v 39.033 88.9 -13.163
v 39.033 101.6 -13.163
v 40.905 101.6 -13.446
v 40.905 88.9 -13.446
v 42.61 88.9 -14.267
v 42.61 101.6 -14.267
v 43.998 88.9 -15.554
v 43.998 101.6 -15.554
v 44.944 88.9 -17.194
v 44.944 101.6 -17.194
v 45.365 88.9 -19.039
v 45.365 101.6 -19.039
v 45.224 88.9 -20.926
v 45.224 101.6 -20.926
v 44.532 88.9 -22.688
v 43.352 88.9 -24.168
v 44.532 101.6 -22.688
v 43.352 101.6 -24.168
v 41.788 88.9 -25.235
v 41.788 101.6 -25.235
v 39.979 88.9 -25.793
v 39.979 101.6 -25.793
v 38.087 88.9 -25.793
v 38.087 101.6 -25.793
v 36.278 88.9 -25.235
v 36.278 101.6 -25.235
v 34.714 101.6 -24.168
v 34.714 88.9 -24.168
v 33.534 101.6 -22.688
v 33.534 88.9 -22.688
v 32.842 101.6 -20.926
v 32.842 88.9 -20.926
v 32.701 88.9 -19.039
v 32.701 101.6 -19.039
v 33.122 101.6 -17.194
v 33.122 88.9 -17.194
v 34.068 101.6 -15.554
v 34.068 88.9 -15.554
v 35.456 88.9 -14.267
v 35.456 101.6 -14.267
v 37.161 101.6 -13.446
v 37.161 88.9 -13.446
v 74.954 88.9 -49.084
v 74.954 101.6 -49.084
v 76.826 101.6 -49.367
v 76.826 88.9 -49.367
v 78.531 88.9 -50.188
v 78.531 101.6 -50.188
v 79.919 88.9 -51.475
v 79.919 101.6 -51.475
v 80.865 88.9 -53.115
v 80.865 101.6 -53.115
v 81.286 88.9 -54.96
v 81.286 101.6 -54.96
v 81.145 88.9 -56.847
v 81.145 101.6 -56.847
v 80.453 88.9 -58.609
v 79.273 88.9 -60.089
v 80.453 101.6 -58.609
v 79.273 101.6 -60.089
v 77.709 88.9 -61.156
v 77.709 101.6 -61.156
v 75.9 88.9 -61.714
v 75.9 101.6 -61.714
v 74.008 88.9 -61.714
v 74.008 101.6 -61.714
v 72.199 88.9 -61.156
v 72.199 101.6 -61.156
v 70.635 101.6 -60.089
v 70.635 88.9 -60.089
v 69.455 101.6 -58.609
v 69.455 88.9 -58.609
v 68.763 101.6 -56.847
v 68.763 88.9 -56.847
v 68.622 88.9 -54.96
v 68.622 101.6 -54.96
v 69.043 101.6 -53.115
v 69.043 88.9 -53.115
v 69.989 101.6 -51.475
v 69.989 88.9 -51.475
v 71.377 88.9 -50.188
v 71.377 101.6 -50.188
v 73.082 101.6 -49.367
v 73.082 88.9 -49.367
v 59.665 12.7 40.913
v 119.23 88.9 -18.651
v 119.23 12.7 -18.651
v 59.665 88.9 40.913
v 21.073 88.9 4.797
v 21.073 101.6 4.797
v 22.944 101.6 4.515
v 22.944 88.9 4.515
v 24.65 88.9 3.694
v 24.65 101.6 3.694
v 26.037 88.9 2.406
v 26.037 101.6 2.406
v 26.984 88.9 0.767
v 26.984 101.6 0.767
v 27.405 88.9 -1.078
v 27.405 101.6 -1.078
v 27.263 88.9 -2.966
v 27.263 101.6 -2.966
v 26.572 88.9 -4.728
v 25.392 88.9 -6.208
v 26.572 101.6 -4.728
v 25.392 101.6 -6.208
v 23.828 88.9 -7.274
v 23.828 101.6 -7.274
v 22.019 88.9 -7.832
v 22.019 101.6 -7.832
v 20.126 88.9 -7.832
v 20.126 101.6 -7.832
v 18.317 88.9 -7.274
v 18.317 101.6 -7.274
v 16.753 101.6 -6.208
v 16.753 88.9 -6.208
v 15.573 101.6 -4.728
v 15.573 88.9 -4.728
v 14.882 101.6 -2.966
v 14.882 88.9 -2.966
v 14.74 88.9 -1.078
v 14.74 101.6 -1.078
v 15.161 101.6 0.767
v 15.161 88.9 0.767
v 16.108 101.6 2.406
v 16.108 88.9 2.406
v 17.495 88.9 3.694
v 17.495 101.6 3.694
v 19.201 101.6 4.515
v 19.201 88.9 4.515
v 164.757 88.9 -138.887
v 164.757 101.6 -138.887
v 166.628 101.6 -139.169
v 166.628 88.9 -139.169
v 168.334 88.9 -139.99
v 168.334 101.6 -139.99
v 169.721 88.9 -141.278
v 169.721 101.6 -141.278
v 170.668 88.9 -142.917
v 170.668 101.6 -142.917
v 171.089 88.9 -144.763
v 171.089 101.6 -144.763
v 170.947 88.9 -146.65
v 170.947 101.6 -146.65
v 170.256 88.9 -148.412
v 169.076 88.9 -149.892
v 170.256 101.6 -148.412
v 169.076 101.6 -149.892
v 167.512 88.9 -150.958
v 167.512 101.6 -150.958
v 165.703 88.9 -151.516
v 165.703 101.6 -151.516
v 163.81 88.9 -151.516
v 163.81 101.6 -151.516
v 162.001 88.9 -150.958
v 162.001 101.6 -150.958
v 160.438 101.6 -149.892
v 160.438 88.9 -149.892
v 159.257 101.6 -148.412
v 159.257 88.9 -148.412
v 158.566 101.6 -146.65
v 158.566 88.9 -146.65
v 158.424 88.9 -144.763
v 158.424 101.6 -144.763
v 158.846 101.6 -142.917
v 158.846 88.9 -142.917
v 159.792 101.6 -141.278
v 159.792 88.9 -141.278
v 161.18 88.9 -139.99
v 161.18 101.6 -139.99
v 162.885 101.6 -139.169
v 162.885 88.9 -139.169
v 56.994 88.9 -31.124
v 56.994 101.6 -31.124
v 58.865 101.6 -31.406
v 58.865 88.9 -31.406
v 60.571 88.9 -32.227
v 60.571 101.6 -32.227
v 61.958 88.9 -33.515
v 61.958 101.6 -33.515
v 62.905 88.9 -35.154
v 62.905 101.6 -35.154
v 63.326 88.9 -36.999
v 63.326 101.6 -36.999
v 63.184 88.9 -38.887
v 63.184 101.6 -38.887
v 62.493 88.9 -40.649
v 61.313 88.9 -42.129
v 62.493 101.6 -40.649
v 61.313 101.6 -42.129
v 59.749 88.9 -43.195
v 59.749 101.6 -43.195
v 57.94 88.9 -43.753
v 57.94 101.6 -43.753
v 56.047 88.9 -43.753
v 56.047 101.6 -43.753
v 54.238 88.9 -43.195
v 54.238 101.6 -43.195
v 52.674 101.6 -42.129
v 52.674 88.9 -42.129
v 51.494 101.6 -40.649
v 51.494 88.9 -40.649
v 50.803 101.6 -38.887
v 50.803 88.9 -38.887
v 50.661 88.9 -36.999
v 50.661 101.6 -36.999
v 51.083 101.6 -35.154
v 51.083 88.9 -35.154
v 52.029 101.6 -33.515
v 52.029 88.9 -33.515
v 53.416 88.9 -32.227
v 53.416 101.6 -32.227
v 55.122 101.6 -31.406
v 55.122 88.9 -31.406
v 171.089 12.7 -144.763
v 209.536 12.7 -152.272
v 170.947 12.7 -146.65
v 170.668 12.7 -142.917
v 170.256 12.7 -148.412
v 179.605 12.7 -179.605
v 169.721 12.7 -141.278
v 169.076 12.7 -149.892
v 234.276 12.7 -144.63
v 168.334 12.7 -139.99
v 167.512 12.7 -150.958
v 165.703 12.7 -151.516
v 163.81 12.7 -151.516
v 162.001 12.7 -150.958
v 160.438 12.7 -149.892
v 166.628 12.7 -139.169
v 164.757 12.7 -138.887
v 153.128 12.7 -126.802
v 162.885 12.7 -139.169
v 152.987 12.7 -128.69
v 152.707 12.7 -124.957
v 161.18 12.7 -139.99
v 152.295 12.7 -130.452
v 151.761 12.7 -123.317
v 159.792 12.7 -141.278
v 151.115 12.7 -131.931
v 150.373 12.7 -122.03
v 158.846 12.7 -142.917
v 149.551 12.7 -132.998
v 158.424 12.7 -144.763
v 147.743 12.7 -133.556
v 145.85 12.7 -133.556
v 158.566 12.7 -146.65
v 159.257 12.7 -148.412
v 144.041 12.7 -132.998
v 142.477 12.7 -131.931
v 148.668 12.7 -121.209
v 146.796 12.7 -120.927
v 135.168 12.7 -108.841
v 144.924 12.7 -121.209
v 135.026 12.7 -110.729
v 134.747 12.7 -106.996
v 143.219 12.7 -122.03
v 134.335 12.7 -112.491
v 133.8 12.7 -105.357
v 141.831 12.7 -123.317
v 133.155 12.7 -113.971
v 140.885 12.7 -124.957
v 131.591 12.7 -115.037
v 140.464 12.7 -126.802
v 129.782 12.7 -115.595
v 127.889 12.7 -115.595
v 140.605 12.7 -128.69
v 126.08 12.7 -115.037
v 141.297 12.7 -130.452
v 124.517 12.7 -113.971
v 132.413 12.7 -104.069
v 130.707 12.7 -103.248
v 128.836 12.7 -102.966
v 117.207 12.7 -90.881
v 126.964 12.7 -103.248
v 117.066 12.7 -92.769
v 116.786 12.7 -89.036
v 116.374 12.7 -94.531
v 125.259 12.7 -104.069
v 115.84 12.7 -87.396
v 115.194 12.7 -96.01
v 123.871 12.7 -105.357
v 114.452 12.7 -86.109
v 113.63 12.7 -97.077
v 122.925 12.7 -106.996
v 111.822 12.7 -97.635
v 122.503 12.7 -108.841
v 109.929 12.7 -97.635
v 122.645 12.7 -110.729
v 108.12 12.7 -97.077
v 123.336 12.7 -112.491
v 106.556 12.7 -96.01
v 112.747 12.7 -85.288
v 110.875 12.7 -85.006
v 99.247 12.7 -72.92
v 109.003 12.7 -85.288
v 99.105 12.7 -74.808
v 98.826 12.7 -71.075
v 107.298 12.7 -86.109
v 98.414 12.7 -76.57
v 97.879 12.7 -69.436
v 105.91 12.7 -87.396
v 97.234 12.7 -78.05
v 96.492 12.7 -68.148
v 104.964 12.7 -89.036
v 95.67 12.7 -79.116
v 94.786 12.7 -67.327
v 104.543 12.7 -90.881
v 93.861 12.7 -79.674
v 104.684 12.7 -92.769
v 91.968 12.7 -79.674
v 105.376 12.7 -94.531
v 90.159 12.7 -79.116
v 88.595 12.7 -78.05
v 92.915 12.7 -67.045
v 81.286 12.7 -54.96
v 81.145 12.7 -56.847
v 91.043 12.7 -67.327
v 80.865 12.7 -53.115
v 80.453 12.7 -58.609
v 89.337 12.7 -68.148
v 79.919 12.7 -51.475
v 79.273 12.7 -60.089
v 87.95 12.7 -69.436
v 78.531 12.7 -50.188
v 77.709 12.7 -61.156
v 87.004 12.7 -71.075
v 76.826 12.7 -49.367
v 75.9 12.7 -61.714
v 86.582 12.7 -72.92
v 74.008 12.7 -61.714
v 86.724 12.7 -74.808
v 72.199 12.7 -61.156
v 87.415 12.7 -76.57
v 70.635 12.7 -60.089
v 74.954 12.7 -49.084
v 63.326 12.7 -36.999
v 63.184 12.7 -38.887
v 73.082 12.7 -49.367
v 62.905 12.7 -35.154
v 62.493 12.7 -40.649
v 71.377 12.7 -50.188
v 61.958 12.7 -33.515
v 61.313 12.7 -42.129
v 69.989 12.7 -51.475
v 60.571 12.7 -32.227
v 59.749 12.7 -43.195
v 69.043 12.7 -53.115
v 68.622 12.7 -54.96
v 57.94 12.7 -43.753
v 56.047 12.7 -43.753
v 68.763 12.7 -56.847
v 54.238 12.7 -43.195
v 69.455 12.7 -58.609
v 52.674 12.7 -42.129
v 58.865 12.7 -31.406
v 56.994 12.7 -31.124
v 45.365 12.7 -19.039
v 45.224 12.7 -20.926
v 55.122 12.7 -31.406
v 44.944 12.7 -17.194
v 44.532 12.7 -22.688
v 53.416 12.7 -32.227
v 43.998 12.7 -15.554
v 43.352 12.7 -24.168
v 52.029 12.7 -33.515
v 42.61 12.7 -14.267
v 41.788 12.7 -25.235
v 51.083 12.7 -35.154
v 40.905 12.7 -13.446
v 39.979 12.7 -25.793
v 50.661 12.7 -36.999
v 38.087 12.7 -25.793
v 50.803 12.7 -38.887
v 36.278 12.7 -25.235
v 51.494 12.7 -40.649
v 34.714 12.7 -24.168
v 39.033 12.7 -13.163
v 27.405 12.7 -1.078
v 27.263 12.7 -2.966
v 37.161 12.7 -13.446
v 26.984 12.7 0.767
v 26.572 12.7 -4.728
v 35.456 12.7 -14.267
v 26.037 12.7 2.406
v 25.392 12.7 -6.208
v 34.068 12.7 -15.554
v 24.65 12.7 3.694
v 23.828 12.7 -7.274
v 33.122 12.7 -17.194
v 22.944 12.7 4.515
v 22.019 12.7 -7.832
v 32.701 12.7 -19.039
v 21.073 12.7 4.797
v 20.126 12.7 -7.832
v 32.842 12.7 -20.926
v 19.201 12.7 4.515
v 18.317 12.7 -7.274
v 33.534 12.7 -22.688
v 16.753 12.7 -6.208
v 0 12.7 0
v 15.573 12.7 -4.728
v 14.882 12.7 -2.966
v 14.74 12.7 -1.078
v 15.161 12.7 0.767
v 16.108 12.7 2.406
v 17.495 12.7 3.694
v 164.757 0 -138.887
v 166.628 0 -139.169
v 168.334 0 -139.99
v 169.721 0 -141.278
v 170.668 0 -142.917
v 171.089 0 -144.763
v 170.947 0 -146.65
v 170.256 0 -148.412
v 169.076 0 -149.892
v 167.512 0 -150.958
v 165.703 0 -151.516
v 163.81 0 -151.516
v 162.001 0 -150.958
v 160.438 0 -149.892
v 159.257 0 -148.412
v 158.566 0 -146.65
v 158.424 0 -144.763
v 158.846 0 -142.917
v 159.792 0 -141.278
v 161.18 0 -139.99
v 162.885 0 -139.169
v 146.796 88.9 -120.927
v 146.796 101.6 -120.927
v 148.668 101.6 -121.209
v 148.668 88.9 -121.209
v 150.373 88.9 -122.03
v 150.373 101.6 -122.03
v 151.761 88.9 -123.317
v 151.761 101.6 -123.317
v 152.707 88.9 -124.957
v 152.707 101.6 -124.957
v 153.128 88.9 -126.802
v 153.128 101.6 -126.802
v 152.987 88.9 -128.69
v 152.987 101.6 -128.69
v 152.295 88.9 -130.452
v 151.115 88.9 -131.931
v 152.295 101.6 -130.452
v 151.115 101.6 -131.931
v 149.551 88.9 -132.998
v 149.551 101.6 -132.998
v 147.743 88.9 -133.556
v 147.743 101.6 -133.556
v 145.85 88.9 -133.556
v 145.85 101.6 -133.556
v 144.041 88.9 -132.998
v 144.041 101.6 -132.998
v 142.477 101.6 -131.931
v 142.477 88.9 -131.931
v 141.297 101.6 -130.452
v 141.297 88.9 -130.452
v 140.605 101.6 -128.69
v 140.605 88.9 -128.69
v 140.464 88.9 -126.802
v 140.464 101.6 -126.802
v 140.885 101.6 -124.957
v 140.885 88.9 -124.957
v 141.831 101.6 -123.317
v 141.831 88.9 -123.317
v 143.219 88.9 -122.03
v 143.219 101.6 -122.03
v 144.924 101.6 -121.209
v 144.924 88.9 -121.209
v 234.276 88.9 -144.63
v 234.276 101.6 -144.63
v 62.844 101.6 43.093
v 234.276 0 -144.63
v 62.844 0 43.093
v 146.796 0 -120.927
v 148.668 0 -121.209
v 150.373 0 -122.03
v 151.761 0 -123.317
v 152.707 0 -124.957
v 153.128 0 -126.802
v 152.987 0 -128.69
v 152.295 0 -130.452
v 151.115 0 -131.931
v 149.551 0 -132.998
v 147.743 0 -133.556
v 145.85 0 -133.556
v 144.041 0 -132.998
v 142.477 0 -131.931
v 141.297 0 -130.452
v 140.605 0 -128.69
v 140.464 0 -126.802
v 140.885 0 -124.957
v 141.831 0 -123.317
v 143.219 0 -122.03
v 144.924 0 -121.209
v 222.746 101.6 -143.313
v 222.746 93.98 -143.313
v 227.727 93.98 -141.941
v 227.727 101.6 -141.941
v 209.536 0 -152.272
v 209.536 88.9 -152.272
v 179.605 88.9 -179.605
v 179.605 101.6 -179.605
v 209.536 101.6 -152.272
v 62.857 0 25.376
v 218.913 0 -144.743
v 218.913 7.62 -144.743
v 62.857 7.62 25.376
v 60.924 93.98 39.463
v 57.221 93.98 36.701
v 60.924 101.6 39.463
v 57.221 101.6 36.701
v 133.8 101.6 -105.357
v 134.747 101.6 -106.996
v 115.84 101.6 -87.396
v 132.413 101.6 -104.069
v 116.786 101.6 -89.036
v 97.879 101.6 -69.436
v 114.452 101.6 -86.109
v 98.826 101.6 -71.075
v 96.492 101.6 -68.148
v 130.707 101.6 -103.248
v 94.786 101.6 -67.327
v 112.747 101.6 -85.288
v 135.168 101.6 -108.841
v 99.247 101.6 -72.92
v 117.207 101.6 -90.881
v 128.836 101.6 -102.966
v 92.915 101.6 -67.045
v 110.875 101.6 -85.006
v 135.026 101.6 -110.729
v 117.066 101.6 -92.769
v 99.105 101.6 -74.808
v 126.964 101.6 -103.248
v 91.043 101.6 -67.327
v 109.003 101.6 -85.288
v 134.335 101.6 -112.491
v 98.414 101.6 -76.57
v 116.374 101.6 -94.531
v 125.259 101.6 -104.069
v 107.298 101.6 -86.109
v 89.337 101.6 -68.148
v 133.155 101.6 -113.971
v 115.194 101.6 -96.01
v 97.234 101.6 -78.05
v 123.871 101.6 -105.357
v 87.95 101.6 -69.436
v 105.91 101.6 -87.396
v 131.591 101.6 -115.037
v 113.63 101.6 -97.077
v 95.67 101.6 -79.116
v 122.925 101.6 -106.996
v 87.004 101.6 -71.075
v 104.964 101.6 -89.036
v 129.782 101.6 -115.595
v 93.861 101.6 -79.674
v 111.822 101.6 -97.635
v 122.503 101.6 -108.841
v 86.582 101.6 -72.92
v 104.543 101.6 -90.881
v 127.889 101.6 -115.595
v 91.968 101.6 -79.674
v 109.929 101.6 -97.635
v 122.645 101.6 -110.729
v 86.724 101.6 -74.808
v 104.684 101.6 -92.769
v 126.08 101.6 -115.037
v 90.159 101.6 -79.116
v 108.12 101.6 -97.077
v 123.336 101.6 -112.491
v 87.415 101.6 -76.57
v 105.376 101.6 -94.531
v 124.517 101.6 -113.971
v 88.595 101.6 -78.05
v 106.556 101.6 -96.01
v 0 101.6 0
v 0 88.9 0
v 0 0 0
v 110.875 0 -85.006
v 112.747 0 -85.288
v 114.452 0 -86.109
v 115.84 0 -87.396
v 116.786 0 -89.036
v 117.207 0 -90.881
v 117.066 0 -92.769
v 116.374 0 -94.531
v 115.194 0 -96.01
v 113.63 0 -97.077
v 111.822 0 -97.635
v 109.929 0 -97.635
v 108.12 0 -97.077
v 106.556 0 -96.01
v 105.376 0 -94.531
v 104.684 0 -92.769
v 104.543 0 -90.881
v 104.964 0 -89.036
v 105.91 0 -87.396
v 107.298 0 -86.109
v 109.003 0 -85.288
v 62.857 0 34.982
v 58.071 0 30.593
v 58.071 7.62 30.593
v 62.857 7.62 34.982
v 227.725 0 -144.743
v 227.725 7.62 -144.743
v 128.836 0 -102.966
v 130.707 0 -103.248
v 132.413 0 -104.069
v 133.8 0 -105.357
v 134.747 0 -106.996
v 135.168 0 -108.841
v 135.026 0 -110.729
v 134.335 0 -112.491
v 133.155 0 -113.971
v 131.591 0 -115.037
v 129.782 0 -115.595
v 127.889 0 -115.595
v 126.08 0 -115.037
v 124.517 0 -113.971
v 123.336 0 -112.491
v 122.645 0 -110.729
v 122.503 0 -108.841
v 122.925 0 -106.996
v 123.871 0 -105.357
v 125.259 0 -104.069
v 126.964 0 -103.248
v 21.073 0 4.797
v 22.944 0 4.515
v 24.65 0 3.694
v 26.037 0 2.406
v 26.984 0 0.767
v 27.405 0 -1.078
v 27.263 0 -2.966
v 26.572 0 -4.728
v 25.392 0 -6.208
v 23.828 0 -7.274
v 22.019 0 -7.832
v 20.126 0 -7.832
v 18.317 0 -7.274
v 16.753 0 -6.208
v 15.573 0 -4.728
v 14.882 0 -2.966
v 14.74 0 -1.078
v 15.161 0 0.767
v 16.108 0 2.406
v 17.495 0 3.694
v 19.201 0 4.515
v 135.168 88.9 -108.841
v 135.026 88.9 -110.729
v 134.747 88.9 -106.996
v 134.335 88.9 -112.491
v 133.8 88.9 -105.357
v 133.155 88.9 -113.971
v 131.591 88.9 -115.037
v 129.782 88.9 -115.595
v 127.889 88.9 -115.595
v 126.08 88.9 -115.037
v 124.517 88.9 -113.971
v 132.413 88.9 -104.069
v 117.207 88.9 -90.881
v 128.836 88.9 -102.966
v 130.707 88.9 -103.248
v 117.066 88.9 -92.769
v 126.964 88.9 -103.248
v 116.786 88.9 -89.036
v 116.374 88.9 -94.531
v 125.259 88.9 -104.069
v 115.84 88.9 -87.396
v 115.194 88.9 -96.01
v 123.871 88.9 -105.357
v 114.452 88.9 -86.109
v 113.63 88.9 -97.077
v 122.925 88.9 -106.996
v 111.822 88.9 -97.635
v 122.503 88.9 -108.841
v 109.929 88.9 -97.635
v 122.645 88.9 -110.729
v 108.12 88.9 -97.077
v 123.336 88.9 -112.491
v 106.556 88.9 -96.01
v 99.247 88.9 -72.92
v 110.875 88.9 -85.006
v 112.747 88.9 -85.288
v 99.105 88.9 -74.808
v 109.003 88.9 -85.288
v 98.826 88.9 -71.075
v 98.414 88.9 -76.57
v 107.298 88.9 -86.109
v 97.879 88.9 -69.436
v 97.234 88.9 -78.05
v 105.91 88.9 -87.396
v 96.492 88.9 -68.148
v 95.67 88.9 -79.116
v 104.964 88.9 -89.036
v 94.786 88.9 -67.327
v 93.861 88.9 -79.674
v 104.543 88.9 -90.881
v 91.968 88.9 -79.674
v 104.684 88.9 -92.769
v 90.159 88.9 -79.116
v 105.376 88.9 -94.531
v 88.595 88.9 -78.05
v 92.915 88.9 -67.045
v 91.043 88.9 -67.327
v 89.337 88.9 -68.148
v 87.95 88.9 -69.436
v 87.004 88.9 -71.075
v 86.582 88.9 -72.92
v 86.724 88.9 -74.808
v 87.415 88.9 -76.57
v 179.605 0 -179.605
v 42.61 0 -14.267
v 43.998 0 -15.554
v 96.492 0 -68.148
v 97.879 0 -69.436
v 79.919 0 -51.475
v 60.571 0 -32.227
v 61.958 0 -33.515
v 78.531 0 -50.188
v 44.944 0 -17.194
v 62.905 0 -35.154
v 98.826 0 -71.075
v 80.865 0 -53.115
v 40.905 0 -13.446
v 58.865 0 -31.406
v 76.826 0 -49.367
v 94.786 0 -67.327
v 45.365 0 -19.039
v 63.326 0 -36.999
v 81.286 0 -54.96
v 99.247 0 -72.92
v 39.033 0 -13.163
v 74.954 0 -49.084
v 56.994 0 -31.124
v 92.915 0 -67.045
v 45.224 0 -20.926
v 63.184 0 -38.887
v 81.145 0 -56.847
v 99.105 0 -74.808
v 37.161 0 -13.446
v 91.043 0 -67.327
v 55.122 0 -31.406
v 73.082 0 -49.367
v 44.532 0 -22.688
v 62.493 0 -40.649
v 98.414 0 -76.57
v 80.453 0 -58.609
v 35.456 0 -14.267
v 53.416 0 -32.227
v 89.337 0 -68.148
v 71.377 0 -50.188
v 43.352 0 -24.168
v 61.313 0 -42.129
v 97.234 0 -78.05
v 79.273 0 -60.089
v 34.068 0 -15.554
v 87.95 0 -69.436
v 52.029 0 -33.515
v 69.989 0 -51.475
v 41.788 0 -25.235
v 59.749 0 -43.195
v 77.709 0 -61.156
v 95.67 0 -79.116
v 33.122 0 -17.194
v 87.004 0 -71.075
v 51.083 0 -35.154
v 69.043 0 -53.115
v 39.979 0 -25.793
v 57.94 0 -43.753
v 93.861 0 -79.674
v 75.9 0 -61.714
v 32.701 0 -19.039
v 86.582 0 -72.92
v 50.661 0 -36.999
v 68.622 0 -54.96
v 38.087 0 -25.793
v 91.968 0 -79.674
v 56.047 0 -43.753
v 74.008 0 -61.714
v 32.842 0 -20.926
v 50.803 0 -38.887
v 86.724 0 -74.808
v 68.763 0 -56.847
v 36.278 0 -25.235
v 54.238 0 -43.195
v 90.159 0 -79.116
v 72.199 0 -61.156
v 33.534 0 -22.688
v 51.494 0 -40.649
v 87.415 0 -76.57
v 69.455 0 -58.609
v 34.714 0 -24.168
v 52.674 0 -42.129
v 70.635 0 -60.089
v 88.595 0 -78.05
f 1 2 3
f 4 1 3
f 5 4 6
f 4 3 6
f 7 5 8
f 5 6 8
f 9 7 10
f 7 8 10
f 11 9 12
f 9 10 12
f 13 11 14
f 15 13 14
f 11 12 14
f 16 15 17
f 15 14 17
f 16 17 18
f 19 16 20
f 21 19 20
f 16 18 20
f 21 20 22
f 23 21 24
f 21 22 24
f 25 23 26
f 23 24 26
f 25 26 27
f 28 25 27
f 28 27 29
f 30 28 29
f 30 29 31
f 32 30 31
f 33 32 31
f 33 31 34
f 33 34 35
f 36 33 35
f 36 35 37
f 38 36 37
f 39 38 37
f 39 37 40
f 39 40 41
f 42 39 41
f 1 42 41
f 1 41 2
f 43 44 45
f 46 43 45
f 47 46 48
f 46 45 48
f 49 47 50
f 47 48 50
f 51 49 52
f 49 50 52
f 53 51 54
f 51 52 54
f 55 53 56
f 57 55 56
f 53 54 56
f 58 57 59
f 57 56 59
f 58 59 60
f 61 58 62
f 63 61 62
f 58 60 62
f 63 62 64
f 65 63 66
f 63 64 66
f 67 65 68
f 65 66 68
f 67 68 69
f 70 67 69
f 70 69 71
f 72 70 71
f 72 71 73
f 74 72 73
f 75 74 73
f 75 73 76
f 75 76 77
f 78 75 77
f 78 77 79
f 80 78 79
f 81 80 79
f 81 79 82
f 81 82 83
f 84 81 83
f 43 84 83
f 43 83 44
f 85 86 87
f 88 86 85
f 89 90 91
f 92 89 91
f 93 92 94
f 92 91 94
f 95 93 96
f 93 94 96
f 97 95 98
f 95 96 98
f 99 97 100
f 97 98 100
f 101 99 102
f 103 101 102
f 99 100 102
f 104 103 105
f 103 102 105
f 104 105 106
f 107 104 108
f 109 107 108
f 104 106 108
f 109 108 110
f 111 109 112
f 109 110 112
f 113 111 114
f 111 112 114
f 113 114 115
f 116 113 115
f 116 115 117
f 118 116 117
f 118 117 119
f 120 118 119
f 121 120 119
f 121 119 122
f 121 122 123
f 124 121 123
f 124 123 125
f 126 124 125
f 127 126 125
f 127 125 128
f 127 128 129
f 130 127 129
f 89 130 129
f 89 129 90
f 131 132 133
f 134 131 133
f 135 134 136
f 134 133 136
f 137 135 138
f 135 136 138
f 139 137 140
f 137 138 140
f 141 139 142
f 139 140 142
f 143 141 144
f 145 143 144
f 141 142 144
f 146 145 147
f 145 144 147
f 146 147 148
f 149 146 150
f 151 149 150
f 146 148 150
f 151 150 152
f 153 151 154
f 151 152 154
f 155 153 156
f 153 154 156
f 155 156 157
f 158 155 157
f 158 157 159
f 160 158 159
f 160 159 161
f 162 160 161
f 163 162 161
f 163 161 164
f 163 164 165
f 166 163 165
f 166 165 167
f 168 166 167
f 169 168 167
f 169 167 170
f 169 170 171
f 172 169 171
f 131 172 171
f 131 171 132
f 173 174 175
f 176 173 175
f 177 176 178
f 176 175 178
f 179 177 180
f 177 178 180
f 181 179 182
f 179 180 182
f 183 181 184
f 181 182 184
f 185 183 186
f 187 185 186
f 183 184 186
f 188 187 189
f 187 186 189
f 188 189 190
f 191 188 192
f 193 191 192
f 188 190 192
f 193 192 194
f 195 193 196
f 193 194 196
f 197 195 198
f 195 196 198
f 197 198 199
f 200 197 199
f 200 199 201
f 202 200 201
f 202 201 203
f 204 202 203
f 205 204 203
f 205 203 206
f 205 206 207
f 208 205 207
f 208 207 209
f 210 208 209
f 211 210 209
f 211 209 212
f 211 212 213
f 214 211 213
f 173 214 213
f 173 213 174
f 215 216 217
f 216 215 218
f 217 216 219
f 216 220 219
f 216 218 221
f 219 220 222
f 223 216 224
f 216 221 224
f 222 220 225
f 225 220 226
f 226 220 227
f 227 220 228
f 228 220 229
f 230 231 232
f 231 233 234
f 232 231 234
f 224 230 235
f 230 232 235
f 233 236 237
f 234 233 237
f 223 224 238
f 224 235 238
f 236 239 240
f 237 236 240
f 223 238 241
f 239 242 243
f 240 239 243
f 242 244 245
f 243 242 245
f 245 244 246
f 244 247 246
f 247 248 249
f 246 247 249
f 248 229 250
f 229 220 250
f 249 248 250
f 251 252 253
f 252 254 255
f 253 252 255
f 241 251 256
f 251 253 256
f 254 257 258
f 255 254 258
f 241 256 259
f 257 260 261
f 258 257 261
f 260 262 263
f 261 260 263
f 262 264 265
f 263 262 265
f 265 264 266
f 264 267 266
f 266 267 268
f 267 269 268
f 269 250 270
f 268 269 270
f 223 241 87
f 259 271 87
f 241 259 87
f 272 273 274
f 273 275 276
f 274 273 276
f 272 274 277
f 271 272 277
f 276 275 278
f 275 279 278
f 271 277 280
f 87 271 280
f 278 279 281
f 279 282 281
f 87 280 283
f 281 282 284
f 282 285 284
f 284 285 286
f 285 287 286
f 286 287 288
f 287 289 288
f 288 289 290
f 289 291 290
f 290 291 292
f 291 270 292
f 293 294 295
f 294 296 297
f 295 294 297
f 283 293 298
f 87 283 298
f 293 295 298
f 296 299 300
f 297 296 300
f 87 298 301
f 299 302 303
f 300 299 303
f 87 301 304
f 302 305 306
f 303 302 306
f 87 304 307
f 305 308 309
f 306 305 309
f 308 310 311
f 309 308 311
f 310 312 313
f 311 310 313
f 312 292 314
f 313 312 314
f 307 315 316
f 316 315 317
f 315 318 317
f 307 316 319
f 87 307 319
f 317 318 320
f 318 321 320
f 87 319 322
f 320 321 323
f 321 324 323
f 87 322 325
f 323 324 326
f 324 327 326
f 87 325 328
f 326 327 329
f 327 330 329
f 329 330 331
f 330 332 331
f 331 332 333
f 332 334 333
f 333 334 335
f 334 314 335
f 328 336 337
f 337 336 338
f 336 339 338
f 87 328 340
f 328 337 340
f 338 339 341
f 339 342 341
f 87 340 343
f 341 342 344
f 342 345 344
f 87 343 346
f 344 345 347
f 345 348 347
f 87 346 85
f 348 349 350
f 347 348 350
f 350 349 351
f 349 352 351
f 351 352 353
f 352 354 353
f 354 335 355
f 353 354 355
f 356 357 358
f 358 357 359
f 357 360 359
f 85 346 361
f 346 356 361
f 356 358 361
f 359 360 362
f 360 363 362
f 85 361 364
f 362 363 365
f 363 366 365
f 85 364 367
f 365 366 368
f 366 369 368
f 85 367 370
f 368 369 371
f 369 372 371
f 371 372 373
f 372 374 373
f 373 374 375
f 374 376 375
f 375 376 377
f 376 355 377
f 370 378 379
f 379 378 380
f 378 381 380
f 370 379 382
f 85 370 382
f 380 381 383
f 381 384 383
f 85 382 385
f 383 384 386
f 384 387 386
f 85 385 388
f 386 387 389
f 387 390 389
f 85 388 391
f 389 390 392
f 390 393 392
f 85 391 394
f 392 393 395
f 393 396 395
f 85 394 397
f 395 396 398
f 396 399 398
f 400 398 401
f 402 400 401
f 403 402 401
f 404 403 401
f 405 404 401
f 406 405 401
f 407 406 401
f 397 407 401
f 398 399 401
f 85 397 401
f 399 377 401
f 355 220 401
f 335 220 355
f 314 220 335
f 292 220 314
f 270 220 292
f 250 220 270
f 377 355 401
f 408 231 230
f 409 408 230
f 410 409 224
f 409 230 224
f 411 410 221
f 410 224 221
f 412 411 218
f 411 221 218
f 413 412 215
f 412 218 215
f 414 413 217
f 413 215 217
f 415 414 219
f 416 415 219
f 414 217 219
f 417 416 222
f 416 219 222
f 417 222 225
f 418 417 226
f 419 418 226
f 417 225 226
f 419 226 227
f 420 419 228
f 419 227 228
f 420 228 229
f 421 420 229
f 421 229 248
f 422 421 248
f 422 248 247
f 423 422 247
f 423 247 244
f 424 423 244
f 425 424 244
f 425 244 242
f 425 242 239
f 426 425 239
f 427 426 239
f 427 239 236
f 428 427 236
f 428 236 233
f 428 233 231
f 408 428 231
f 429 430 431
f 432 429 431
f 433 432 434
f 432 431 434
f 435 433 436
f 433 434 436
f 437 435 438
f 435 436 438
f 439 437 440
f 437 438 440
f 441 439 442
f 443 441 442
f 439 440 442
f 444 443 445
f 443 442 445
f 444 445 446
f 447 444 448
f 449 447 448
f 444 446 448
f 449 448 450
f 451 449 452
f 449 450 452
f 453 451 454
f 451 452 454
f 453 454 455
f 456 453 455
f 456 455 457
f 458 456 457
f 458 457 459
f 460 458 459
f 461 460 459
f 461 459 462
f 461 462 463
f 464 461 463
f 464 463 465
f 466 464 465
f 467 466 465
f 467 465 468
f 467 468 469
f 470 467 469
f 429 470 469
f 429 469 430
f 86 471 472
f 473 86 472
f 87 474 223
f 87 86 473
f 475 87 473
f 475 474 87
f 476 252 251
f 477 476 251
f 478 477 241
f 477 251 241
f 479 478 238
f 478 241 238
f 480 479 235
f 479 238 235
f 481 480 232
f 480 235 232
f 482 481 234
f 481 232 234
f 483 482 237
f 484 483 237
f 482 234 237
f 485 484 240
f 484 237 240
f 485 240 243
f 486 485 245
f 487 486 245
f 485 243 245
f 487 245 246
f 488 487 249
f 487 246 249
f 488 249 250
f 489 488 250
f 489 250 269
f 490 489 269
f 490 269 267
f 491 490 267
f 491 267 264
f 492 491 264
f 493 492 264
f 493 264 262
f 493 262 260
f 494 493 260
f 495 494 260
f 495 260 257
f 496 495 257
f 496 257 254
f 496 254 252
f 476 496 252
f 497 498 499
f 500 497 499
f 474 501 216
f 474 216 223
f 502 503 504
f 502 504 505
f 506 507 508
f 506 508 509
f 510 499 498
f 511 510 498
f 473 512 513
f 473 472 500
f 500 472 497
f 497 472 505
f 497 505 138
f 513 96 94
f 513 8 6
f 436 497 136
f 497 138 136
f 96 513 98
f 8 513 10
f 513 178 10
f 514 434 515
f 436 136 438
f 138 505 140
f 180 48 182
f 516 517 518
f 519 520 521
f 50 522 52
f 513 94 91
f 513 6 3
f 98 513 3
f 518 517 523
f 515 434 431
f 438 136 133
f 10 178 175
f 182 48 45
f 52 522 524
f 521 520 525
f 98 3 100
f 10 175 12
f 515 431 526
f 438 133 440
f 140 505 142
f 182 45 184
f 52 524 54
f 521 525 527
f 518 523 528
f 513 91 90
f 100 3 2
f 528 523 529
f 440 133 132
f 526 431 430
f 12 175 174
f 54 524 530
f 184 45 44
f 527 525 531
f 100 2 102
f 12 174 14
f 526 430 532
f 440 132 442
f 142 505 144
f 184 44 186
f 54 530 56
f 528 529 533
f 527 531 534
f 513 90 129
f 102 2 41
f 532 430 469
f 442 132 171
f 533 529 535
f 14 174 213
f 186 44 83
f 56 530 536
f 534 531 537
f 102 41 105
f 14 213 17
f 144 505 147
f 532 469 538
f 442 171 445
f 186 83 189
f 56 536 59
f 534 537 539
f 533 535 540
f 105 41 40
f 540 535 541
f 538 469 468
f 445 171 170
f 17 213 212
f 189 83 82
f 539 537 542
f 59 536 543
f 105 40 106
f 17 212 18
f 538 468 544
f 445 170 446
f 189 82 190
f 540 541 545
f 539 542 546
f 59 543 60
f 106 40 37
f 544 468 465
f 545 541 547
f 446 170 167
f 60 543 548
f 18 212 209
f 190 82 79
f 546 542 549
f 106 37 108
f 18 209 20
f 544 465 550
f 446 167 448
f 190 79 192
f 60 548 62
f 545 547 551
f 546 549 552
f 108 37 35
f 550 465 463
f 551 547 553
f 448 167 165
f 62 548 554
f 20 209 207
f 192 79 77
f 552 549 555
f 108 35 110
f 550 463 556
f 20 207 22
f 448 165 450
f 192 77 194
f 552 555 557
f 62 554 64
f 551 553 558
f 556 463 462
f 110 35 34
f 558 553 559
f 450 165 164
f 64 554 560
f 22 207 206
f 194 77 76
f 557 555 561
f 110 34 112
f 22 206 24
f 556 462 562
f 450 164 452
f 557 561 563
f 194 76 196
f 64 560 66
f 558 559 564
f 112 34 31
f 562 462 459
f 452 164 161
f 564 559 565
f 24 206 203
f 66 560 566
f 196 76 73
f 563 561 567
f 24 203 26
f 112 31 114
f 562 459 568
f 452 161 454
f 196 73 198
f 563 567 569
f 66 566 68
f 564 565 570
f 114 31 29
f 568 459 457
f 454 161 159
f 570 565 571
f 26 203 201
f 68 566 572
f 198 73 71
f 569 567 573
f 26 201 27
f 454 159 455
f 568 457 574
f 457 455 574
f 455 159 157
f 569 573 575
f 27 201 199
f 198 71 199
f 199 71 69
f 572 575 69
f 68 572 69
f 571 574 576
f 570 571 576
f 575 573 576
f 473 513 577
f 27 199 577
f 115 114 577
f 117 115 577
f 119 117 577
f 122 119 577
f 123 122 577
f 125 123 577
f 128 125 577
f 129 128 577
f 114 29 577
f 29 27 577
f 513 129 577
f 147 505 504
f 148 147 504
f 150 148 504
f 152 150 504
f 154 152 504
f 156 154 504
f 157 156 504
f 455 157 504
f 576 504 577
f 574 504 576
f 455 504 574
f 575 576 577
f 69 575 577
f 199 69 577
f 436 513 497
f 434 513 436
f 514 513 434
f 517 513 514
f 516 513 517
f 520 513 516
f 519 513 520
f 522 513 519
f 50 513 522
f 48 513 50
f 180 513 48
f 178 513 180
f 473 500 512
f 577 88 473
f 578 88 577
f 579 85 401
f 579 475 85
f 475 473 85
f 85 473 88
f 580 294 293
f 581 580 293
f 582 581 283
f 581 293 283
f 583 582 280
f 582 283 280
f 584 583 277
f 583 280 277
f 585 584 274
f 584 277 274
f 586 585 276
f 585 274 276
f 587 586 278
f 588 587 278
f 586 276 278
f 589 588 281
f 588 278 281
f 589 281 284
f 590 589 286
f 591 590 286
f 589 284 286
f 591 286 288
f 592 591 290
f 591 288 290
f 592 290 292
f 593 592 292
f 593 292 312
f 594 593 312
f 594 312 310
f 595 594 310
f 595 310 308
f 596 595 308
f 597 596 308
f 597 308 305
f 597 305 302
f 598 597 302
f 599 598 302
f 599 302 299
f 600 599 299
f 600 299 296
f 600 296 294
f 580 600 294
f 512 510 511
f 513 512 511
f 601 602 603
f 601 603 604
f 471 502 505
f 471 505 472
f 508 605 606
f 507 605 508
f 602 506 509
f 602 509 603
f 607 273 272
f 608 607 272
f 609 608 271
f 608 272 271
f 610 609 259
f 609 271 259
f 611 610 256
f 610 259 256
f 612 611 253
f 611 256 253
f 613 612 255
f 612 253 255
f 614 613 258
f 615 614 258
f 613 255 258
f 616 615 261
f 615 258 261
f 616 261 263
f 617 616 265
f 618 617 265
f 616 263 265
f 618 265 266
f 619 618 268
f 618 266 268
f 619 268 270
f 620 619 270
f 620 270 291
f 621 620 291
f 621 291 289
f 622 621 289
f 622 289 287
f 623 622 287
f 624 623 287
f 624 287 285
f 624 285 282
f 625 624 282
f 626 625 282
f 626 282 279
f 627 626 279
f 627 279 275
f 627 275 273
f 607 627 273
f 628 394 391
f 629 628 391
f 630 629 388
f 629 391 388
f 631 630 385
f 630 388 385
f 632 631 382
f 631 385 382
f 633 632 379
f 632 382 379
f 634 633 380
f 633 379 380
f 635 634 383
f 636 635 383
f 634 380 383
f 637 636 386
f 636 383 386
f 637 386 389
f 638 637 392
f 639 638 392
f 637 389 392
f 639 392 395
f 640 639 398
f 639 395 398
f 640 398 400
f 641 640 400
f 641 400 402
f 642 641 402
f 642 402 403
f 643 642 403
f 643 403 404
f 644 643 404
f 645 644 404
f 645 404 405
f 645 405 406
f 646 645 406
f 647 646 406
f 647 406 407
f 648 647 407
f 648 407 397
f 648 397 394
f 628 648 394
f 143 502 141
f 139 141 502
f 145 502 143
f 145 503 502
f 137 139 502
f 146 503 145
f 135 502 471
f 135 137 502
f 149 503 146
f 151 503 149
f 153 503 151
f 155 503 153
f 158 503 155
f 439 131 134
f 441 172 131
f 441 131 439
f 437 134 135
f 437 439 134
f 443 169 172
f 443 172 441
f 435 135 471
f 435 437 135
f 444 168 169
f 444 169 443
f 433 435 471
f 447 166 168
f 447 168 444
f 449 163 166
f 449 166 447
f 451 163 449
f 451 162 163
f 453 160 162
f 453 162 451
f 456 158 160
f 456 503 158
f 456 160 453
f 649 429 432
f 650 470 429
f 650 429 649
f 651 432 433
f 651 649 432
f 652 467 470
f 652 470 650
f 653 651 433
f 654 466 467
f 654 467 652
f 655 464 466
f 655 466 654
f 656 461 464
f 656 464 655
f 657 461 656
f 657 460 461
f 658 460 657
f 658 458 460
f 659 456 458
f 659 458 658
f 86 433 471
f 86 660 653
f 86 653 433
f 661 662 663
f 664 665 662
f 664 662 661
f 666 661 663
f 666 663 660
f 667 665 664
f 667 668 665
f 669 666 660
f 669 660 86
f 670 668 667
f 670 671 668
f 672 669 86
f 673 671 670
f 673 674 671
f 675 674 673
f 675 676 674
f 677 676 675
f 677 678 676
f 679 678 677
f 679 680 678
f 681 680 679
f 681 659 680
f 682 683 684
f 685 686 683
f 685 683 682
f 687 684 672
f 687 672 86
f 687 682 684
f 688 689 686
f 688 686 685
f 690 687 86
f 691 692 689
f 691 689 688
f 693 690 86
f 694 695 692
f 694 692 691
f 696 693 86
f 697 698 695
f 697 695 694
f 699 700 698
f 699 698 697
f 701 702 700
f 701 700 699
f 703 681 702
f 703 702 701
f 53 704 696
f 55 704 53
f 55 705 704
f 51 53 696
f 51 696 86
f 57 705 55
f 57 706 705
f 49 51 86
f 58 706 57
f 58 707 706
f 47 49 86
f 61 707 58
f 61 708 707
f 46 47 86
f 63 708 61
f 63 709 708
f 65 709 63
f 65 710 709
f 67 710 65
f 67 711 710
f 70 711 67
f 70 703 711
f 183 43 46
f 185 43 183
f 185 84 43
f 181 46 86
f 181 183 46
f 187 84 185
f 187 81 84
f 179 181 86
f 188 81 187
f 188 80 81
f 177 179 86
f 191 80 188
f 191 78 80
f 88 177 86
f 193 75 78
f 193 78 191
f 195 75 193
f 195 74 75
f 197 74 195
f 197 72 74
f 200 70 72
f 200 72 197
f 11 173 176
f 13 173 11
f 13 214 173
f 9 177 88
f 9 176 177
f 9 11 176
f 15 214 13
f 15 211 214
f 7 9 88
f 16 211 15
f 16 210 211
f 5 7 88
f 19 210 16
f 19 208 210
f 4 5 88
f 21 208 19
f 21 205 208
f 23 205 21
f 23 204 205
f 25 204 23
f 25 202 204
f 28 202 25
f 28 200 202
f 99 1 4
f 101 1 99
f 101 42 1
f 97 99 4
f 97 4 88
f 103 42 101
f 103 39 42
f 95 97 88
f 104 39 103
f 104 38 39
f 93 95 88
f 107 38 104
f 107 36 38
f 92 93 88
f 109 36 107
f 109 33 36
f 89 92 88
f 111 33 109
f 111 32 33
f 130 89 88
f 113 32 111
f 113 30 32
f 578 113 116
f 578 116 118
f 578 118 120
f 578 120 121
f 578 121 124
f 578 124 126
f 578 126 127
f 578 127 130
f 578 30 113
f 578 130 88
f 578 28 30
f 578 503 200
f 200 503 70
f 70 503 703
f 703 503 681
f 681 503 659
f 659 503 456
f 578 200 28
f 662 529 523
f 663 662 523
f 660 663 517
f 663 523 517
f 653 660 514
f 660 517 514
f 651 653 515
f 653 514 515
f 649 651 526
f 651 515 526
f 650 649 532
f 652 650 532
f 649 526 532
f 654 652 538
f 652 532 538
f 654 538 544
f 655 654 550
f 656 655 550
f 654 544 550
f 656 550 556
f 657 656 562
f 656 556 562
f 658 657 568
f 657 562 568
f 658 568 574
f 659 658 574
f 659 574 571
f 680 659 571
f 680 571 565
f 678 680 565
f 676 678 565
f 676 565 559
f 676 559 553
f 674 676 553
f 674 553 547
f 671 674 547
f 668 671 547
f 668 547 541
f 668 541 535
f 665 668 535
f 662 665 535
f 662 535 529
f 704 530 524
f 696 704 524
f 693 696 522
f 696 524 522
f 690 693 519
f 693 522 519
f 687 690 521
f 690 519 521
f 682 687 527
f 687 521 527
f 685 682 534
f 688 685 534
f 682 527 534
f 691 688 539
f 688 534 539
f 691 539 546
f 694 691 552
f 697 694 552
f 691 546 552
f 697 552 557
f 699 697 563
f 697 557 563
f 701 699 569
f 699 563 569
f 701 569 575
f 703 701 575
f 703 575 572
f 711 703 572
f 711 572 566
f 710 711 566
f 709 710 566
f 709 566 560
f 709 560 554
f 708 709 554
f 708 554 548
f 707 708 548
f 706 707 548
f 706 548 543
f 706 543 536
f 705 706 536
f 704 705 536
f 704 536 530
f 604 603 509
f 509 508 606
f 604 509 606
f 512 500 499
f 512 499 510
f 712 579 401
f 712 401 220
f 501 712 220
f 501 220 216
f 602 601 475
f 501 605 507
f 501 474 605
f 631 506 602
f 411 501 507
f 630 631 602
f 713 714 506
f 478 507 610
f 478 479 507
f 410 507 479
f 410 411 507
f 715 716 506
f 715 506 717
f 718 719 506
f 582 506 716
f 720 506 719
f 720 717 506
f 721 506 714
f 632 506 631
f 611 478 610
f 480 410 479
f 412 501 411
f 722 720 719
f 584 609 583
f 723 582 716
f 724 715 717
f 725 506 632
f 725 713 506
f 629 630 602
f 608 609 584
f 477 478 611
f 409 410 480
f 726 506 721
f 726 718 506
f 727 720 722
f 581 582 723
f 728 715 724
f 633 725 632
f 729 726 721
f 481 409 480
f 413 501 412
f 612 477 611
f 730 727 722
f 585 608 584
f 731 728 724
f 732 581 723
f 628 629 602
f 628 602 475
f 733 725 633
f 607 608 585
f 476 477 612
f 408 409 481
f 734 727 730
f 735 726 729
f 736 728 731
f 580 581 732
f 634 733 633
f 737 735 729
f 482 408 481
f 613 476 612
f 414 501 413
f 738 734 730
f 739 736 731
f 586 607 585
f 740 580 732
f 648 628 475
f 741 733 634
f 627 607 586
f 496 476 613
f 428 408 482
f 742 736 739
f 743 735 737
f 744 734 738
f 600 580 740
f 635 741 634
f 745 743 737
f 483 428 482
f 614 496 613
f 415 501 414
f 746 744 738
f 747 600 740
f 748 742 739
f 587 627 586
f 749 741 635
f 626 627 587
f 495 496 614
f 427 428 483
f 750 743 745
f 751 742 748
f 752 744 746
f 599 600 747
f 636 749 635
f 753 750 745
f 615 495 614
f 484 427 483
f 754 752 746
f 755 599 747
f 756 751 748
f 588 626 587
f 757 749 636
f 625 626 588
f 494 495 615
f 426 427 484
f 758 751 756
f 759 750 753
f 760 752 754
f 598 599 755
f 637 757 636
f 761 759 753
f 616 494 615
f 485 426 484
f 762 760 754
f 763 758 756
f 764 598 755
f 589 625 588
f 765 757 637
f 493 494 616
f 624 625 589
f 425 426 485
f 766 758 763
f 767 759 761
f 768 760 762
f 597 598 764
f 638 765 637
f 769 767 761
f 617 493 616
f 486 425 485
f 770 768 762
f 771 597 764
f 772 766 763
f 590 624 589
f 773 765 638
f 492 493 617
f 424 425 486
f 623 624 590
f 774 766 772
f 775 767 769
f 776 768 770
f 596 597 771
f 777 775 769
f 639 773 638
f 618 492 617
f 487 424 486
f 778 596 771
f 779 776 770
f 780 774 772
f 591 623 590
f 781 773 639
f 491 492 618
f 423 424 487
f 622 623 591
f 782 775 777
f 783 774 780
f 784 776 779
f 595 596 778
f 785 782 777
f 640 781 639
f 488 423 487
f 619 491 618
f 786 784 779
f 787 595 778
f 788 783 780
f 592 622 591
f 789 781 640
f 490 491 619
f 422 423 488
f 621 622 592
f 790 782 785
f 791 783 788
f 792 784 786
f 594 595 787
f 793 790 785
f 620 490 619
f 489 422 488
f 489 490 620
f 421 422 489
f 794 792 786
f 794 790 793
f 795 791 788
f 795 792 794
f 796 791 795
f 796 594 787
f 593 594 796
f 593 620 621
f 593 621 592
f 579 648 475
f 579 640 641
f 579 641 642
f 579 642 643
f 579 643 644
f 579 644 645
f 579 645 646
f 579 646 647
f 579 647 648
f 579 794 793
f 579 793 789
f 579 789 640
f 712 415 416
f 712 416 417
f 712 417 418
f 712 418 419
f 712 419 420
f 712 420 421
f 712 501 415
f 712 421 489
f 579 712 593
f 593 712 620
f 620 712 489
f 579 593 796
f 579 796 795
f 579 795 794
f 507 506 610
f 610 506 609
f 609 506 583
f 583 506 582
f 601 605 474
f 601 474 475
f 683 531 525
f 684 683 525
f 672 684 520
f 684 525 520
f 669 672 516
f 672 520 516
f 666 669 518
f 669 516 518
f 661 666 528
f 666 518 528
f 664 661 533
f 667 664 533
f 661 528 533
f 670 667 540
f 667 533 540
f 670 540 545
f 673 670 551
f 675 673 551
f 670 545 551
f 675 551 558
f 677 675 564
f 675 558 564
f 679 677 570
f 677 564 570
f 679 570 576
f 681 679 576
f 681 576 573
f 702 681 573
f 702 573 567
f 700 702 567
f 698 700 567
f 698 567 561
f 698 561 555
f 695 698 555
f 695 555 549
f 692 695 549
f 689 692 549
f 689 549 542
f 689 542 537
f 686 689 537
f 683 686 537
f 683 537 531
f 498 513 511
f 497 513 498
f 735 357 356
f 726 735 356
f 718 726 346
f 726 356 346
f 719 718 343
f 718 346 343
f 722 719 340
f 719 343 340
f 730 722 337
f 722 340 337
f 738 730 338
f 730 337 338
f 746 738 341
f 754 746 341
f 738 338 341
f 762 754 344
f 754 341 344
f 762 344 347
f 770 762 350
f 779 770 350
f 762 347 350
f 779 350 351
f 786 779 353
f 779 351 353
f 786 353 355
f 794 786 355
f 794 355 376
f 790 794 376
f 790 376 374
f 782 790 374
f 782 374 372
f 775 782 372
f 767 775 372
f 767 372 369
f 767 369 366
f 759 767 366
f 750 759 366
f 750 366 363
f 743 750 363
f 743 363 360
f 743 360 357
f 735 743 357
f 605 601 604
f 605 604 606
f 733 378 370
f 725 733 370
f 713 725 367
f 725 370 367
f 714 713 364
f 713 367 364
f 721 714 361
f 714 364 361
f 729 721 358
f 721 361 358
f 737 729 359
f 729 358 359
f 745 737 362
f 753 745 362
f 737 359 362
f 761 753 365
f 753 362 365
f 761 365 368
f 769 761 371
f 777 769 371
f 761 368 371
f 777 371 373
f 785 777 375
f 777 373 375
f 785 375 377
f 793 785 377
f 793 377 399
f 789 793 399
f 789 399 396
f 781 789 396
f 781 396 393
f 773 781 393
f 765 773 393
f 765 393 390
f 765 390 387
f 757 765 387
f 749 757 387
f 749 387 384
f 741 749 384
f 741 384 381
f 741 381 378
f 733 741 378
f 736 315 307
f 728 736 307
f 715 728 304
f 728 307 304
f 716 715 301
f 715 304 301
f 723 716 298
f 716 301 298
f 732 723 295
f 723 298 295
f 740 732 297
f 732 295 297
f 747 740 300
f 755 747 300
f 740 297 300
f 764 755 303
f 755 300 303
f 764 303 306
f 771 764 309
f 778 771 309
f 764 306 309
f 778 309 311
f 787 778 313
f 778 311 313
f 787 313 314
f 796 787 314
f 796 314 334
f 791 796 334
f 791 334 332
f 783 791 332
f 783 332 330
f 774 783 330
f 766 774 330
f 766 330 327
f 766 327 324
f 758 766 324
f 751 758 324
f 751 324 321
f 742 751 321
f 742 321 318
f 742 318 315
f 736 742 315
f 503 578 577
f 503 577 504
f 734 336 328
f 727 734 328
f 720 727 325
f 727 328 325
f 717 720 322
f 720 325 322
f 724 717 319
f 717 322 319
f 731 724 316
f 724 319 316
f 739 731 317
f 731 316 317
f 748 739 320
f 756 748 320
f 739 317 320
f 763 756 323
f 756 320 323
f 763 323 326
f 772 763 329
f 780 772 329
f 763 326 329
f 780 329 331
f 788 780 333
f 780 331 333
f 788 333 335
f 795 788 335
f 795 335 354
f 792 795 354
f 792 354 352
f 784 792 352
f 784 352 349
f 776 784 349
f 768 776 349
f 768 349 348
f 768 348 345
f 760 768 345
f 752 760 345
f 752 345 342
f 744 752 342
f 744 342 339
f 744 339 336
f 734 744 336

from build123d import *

# Parameters (mm, degrees)
BOSS_EXTRUDE1_DEPTH = 101.6
SKETCH2_W           = 267.926874414
SKETCH2_H           = 76.2
CUT_EXTRUDE1_DEPTH  = 71.12
SKETCH3_R           = 6.35
CUT_EXTRUDE3_DEPTH  = 313.194791695
CUT_EXTRUDE4_DEPTH  = 7.62
CUT_EXTRUDE5_DEPTH  = 7.62


with BuildPart() as part:
    # Sketch1 → Boss-Extrude1 (new body)
    with BuildSketch(Plane(origin=(0, 0, 0), x_dir=(1, 0, 0), z_dir=(0, 1, 0))):
        Polygon((0, 0), (179.605122421, 179.605122421), (209.535625582, 152.272255569), (234.275538547, 144.630280974), (62.844388347, -43.093188015), align=None)
    extrude(amount=BOSS_EXTRUDE1_DEPTH)

    # Sketch2 → Cut-Extrude1 (cut)
    with BuildSketch(Plane(origin=(0, 0, 0), x_dir=(-0.7071067811865464, 0, 0.7071067811865487), z_dir=(-0.7071067811865487, 0, -0.7071067811865464))):
        with Locations((-133.963437207, 50.8)):
            Rectangle(SKETCH2_W, SKETCH2_H)
    extrude(amount=-CUT_EXTRUDE1_DEPTH, mode=Mode.SUBTRACT)

    # Sketch3 → Cut-Extrude3 (cut, through all)
    with BuildSketch(Plane(origin=(0, 101.6, 0), x_dir=(1, 0, 0), z_dir=(0, 1, 0))):
        with Locations(Location((21.07252481, 1.552947287, 0), (0, 0, 270))):
            Circle(SKETCH3_R)
        with Locations(Location((39.033037052, 19.513459529, 0), (0, 0, 270))):
            Circle(SKETCH3_R)
        with Locations(Location((56.993549294, 37.473971772, 0), (0, 0, 270))):
            Circle(SKETCH3_R)
        with Locations(Location((74.954061536, 55.434484014, 0), (0, 0, 270))):
            Circle(SKETCH3_R)
        with Locations(Location((92.914573778, 73.394996256, 0), (0, 0, 270))):
            Circle(SKETCH3_R)
        with Locations(Location((110.87508602, 91.355508498, 0), (0, 0, 270))):
            Circle(SKETCH3_R)
        with Locations(Location((128.835598263, 109.31602074, 0), (0, 0, 270))):
            Circle(SKETCH3_R)
        with Locations(Location((146.796110505, 127.276532982, 0), (0, 0, 270))):
            Circle(SKETCH3_R)
        with Locations(Location((164.756622747, 145.237045224, 0), (0, 0, 270))):
            Circle(SKETCH3_R)
    extrude(amount=-CUT_EXTRUDE3_DEPTH, mode=Mode.SUBTRACT)

    # Sketch4 → Cut-Extrude4 (cut)
    with BuildSketch(Plane(origin=(0, 101.6, 0), x_dir=(1, 0, 0), z_dir=(0, 1, 0))):
        Polygon((57.221000047, -36.701269589), (222.746181499, 143.313374464), (227.72700376, 141.940671831), (60.924166757, -39.463469017), align=None)
    extrude(amount=-CUT_EXTRUDE4_DEPTH, mode=Mode.SUBTRACT)

    # Sketch5 → Cut-Extrude5 (cut)
    with BuildSketch(Plane(origin=(0, 0, 0), x_dir=(-1, 0, 0), z_dir=(0, -1, 0))):
        Polygon((-218.913299563, 144.742548401), (-62.856752097, -25.376237408), (-58.071451081, -30.592741372), (-62.856752097, -34.982483231), (-227.725480711, 144.742548401), align=None)
    extrude(amount=-CUT_EXTRUDE5_DEPTH, mode=Mode.SUBTRACT)


solid = part.part
